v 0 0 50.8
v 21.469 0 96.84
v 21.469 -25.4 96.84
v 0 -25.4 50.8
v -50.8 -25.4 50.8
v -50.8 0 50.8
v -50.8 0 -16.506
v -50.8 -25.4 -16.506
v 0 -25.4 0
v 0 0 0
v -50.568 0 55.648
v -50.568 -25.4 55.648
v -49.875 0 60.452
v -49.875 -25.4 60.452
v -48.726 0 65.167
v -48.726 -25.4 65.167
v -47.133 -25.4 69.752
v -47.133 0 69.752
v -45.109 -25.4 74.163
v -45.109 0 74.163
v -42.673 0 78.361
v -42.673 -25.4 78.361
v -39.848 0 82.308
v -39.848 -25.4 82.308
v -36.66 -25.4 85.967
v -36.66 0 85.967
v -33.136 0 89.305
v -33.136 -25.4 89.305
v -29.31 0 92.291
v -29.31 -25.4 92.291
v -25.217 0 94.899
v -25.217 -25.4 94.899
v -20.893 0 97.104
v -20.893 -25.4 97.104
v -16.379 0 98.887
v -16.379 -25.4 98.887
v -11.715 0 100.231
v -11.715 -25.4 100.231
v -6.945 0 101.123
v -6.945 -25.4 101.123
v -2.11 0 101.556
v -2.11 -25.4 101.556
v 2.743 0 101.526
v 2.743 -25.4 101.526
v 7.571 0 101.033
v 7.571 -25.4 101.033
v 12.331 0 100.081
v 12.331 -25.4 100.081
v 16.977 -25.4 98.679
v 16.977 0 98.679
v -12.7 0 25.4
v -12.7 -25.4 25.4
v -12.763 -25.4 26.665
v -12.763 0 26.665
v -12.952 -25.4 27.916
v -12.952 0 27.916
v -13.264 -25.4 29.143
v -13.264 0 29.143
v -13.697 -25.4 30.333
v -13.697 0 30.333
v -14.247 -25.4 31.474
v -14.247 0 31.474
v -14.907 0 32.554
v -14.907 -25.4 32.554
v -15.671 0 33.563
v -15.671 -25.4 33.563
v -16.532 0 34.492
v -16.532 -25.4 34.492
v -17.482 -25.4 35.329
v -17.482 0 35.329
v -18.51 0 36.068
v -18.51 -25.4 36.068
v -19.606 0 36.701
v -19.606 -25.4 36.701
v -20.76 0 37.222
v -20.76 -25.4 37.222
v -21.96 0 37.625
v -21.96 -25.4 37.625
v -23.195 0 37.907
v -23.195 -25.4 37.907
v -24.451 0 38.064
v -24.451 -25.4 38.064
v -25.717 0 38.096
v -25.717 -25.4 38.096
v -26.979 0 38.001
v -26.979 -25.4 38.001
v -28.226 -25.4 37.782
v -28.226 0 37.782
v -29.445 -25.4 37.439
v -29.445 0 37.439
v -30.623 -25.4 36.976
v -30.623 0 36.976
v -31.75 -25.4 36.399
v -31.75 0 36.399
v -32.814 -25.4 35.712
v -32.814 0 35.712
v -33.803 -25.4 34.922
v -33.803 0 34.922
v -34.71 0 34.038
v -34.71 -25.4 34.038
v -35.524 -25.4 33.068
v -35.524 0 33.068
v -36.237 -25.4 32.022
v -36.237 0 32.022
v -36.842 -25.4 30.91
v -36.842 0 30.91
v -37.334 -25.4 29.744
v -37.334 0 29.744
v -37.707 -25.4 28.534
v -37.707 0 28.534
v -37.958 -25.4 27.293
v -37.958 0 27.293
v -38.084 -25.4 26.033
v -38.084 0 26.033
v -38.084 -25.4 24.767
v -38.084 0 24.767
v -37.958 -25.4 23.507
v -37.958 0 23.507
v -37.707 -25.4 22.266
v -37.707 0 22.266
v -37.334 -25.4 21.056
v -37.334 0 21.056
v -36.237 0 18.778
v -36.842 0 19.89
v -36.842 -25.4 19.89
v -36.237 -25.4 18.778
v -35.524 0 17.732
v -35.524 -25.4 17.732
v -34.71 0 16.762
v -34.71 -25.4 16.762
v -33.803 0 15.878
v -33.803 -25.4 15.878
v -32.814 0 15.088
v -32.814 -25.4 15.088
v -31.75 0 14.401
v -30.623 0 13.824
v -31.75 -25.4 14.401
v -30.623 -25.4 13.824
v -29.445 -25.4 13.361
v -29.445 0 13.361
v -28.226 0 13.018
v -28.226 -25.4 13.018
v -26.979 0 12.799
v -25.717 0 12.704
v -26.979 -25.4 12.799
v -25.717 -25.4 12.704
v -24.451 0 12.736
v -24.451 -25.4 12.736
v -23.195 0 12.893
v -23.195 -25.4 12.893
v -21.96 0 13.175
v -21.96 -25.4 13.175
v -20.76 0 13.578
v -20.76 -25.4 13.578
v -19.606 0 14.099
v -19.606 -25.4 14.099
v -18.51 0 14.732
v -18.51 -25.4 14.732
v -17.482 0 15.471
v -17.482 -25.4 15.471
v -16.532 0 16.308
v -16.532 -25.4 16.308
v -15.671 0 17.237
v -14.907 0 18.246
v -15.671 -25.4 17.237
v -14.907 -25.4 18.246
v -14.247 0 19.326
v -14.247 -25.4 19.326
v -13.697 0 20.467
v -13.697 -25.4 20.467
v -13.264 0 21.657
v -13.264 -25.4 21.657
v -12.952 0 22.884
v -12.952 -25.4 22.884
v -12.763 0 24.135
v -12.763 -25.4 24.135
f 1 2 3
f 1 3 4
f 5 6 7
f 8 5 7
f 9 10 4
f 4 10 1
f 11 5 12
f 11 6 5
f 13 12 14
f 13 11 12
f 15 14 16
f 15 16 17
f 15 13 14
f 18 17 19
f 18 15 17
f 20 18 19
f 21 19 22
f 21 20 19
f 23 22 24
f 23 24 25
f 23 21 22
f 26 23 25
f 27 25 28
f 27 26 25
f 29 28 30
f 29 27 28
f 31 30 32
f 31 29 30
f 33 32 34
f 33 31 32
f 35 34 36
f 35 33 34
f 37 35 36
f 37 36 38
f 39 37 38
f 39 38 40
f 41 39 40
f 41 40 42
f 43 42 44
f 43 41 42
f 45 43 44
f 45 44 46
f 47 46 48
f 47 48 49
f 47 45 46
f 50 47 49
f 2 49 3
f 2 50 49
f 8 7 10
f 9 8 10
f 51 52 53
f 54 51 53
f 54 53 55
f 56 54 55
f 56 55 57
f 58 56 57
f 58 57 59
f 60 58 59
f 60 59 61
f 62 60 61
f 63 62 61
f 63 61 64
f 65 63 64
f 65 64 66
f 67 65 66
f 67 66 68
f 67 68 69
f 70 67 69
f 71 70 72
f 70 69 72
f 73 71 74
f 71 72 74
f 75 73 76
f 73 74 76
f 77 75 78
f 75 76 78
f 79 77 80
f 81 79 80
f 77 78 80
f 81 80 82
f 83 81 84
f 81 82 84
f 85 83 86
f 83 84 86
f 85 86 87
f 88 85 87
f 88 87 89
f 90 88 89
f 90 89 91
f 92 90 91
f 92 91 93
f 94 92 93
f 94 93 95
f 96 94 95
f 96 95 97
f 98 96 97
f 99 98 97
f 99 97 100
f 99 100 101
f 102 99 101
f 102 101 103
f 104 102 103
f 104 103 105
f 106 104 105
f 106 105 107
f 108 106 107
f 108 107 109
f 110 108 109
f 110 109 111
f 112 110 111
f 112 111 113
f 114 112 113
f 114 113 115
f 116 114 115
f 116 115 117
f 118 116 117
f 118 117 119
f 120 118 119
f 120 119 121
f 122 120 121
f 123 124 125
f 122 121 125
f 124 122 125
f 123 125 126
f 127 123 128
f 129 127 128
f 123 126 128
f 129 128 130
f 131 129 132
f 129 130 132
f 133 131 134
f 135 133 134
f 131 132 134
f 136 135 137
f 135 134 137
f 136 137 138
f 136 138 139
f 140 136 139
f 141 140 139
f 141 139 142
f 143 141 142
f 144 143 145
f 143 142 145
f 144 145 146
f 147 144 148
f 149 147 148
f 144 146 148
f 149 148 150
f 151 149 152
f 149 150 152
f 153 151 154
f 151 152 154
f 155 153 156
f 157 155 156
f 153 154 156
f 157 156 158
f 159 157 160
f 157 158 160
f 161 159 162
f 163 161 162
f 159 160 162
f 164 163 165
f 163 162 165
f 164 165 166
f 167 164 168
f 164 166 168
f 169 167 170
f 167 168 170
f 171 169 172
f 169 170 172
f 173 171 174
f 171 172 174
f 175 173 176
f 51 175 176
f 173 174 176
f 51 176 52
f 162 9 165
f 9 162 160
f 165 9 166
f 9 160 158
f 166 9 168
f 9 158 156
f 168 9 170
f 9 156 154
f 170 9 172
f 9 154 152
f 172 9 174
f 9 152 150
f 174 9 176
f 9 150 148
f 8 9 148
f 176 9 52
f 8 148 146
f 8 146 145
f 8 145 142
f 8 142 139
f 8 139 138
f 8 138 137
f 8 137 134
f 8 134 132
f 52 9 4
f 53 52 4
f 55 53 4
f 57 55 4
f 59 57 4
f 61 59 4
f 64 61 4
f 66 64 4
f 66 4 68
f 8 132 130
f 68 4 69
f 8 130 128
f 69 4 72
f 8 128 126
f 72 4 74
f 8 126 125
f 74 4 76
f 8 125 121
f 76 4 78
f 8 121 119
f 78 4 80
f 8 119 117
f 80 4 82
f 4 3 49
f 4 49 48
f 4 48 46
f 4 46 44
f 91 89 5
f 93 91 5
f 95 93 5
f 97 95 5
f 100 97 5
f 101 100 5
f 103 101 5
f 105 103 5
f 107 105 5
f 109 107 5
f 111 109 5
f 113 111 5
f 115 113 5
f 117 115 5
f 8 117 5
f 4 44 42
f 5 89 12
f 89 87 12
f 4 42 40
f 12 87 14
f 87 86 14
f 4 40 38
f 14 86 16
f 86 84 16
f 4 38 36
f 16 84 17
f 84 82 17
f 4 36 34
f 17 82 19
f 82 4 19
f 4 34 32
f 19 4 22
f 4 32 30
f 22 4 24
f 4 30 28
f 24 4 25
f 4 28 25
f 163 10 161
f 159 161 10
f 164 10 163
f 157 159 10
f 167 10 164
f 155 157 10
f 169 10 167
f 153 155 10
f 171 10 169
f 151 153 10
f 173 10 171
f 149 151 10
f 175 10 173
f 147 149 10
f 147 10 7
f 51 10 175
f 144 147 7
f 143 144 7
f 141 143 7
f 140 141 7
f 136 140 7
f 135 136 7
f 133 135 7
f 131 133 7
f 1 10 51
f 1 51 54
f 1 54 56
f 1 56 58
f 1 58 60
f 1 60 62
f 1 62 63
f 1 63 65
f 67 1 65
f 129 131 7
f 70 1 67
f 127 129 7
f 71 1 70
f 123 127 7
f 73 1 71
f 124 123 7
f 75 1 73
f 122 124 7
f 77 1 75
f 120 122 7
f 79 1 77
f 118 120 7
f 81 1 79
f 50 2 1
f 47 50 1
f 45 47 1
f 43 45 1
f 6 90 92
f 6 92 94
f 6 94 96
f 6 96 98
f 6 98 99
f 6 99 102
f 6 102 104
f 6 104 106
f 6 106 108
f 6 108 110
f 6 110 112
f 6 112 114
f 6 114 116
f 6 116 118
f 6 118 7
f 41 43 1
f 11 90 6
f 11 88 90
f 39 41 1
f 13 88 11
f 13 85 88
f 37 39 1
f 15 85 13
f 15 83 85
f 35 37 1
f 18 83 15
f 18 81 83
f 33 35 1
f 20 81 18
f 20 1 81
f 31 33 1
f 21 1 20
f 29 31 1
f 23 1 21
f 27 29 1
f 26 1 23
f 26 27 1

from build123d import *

# Parameters (mm, degrees)
F1_DEPTH   = 25.4
F2_R       = 12.7
F3_DEPTH   = 25.401
F1_FACE1_W = 50.8
F1_FACE1_H = 25.4
F4_ANGLE   = 115


with BuildPart() as f1:
    # F0 (on Front) → F1 (new body)
    with BuildSketch(Plane.XZ):
        Polygon((0, 50.8), (-50.8, 50.8), (-50.8, -16.5059205686), (0, 0), align=None)
    extrude(amount=F1_DEPTH)

    # F2 (on face) → F3 (cut, through all)
    with BuildSketch(Plane.XZ.offset(25.4)):
        with Locations((-25.4, 25.4)):
            Circle(F2_R)
    extrude(amount=-F3_DEPTH, mode=Mode.SUBTRACT)

    # F1_face1 (on face) → F4 (revolve)
    with BuildSketch(Plane(origin=(-25.4, -12.7, 50.8), x_dir=(1, 0, 0), z_dir=(0, 0, 1))):
        Rectangle(F1_FACE1_W, F1_FACE1_H)
    revolve(axis=Axis((0, -12.7, 50.8), (0, 1, 0)), revolution_arc=F4_ANGLE)


solid = f1.part
